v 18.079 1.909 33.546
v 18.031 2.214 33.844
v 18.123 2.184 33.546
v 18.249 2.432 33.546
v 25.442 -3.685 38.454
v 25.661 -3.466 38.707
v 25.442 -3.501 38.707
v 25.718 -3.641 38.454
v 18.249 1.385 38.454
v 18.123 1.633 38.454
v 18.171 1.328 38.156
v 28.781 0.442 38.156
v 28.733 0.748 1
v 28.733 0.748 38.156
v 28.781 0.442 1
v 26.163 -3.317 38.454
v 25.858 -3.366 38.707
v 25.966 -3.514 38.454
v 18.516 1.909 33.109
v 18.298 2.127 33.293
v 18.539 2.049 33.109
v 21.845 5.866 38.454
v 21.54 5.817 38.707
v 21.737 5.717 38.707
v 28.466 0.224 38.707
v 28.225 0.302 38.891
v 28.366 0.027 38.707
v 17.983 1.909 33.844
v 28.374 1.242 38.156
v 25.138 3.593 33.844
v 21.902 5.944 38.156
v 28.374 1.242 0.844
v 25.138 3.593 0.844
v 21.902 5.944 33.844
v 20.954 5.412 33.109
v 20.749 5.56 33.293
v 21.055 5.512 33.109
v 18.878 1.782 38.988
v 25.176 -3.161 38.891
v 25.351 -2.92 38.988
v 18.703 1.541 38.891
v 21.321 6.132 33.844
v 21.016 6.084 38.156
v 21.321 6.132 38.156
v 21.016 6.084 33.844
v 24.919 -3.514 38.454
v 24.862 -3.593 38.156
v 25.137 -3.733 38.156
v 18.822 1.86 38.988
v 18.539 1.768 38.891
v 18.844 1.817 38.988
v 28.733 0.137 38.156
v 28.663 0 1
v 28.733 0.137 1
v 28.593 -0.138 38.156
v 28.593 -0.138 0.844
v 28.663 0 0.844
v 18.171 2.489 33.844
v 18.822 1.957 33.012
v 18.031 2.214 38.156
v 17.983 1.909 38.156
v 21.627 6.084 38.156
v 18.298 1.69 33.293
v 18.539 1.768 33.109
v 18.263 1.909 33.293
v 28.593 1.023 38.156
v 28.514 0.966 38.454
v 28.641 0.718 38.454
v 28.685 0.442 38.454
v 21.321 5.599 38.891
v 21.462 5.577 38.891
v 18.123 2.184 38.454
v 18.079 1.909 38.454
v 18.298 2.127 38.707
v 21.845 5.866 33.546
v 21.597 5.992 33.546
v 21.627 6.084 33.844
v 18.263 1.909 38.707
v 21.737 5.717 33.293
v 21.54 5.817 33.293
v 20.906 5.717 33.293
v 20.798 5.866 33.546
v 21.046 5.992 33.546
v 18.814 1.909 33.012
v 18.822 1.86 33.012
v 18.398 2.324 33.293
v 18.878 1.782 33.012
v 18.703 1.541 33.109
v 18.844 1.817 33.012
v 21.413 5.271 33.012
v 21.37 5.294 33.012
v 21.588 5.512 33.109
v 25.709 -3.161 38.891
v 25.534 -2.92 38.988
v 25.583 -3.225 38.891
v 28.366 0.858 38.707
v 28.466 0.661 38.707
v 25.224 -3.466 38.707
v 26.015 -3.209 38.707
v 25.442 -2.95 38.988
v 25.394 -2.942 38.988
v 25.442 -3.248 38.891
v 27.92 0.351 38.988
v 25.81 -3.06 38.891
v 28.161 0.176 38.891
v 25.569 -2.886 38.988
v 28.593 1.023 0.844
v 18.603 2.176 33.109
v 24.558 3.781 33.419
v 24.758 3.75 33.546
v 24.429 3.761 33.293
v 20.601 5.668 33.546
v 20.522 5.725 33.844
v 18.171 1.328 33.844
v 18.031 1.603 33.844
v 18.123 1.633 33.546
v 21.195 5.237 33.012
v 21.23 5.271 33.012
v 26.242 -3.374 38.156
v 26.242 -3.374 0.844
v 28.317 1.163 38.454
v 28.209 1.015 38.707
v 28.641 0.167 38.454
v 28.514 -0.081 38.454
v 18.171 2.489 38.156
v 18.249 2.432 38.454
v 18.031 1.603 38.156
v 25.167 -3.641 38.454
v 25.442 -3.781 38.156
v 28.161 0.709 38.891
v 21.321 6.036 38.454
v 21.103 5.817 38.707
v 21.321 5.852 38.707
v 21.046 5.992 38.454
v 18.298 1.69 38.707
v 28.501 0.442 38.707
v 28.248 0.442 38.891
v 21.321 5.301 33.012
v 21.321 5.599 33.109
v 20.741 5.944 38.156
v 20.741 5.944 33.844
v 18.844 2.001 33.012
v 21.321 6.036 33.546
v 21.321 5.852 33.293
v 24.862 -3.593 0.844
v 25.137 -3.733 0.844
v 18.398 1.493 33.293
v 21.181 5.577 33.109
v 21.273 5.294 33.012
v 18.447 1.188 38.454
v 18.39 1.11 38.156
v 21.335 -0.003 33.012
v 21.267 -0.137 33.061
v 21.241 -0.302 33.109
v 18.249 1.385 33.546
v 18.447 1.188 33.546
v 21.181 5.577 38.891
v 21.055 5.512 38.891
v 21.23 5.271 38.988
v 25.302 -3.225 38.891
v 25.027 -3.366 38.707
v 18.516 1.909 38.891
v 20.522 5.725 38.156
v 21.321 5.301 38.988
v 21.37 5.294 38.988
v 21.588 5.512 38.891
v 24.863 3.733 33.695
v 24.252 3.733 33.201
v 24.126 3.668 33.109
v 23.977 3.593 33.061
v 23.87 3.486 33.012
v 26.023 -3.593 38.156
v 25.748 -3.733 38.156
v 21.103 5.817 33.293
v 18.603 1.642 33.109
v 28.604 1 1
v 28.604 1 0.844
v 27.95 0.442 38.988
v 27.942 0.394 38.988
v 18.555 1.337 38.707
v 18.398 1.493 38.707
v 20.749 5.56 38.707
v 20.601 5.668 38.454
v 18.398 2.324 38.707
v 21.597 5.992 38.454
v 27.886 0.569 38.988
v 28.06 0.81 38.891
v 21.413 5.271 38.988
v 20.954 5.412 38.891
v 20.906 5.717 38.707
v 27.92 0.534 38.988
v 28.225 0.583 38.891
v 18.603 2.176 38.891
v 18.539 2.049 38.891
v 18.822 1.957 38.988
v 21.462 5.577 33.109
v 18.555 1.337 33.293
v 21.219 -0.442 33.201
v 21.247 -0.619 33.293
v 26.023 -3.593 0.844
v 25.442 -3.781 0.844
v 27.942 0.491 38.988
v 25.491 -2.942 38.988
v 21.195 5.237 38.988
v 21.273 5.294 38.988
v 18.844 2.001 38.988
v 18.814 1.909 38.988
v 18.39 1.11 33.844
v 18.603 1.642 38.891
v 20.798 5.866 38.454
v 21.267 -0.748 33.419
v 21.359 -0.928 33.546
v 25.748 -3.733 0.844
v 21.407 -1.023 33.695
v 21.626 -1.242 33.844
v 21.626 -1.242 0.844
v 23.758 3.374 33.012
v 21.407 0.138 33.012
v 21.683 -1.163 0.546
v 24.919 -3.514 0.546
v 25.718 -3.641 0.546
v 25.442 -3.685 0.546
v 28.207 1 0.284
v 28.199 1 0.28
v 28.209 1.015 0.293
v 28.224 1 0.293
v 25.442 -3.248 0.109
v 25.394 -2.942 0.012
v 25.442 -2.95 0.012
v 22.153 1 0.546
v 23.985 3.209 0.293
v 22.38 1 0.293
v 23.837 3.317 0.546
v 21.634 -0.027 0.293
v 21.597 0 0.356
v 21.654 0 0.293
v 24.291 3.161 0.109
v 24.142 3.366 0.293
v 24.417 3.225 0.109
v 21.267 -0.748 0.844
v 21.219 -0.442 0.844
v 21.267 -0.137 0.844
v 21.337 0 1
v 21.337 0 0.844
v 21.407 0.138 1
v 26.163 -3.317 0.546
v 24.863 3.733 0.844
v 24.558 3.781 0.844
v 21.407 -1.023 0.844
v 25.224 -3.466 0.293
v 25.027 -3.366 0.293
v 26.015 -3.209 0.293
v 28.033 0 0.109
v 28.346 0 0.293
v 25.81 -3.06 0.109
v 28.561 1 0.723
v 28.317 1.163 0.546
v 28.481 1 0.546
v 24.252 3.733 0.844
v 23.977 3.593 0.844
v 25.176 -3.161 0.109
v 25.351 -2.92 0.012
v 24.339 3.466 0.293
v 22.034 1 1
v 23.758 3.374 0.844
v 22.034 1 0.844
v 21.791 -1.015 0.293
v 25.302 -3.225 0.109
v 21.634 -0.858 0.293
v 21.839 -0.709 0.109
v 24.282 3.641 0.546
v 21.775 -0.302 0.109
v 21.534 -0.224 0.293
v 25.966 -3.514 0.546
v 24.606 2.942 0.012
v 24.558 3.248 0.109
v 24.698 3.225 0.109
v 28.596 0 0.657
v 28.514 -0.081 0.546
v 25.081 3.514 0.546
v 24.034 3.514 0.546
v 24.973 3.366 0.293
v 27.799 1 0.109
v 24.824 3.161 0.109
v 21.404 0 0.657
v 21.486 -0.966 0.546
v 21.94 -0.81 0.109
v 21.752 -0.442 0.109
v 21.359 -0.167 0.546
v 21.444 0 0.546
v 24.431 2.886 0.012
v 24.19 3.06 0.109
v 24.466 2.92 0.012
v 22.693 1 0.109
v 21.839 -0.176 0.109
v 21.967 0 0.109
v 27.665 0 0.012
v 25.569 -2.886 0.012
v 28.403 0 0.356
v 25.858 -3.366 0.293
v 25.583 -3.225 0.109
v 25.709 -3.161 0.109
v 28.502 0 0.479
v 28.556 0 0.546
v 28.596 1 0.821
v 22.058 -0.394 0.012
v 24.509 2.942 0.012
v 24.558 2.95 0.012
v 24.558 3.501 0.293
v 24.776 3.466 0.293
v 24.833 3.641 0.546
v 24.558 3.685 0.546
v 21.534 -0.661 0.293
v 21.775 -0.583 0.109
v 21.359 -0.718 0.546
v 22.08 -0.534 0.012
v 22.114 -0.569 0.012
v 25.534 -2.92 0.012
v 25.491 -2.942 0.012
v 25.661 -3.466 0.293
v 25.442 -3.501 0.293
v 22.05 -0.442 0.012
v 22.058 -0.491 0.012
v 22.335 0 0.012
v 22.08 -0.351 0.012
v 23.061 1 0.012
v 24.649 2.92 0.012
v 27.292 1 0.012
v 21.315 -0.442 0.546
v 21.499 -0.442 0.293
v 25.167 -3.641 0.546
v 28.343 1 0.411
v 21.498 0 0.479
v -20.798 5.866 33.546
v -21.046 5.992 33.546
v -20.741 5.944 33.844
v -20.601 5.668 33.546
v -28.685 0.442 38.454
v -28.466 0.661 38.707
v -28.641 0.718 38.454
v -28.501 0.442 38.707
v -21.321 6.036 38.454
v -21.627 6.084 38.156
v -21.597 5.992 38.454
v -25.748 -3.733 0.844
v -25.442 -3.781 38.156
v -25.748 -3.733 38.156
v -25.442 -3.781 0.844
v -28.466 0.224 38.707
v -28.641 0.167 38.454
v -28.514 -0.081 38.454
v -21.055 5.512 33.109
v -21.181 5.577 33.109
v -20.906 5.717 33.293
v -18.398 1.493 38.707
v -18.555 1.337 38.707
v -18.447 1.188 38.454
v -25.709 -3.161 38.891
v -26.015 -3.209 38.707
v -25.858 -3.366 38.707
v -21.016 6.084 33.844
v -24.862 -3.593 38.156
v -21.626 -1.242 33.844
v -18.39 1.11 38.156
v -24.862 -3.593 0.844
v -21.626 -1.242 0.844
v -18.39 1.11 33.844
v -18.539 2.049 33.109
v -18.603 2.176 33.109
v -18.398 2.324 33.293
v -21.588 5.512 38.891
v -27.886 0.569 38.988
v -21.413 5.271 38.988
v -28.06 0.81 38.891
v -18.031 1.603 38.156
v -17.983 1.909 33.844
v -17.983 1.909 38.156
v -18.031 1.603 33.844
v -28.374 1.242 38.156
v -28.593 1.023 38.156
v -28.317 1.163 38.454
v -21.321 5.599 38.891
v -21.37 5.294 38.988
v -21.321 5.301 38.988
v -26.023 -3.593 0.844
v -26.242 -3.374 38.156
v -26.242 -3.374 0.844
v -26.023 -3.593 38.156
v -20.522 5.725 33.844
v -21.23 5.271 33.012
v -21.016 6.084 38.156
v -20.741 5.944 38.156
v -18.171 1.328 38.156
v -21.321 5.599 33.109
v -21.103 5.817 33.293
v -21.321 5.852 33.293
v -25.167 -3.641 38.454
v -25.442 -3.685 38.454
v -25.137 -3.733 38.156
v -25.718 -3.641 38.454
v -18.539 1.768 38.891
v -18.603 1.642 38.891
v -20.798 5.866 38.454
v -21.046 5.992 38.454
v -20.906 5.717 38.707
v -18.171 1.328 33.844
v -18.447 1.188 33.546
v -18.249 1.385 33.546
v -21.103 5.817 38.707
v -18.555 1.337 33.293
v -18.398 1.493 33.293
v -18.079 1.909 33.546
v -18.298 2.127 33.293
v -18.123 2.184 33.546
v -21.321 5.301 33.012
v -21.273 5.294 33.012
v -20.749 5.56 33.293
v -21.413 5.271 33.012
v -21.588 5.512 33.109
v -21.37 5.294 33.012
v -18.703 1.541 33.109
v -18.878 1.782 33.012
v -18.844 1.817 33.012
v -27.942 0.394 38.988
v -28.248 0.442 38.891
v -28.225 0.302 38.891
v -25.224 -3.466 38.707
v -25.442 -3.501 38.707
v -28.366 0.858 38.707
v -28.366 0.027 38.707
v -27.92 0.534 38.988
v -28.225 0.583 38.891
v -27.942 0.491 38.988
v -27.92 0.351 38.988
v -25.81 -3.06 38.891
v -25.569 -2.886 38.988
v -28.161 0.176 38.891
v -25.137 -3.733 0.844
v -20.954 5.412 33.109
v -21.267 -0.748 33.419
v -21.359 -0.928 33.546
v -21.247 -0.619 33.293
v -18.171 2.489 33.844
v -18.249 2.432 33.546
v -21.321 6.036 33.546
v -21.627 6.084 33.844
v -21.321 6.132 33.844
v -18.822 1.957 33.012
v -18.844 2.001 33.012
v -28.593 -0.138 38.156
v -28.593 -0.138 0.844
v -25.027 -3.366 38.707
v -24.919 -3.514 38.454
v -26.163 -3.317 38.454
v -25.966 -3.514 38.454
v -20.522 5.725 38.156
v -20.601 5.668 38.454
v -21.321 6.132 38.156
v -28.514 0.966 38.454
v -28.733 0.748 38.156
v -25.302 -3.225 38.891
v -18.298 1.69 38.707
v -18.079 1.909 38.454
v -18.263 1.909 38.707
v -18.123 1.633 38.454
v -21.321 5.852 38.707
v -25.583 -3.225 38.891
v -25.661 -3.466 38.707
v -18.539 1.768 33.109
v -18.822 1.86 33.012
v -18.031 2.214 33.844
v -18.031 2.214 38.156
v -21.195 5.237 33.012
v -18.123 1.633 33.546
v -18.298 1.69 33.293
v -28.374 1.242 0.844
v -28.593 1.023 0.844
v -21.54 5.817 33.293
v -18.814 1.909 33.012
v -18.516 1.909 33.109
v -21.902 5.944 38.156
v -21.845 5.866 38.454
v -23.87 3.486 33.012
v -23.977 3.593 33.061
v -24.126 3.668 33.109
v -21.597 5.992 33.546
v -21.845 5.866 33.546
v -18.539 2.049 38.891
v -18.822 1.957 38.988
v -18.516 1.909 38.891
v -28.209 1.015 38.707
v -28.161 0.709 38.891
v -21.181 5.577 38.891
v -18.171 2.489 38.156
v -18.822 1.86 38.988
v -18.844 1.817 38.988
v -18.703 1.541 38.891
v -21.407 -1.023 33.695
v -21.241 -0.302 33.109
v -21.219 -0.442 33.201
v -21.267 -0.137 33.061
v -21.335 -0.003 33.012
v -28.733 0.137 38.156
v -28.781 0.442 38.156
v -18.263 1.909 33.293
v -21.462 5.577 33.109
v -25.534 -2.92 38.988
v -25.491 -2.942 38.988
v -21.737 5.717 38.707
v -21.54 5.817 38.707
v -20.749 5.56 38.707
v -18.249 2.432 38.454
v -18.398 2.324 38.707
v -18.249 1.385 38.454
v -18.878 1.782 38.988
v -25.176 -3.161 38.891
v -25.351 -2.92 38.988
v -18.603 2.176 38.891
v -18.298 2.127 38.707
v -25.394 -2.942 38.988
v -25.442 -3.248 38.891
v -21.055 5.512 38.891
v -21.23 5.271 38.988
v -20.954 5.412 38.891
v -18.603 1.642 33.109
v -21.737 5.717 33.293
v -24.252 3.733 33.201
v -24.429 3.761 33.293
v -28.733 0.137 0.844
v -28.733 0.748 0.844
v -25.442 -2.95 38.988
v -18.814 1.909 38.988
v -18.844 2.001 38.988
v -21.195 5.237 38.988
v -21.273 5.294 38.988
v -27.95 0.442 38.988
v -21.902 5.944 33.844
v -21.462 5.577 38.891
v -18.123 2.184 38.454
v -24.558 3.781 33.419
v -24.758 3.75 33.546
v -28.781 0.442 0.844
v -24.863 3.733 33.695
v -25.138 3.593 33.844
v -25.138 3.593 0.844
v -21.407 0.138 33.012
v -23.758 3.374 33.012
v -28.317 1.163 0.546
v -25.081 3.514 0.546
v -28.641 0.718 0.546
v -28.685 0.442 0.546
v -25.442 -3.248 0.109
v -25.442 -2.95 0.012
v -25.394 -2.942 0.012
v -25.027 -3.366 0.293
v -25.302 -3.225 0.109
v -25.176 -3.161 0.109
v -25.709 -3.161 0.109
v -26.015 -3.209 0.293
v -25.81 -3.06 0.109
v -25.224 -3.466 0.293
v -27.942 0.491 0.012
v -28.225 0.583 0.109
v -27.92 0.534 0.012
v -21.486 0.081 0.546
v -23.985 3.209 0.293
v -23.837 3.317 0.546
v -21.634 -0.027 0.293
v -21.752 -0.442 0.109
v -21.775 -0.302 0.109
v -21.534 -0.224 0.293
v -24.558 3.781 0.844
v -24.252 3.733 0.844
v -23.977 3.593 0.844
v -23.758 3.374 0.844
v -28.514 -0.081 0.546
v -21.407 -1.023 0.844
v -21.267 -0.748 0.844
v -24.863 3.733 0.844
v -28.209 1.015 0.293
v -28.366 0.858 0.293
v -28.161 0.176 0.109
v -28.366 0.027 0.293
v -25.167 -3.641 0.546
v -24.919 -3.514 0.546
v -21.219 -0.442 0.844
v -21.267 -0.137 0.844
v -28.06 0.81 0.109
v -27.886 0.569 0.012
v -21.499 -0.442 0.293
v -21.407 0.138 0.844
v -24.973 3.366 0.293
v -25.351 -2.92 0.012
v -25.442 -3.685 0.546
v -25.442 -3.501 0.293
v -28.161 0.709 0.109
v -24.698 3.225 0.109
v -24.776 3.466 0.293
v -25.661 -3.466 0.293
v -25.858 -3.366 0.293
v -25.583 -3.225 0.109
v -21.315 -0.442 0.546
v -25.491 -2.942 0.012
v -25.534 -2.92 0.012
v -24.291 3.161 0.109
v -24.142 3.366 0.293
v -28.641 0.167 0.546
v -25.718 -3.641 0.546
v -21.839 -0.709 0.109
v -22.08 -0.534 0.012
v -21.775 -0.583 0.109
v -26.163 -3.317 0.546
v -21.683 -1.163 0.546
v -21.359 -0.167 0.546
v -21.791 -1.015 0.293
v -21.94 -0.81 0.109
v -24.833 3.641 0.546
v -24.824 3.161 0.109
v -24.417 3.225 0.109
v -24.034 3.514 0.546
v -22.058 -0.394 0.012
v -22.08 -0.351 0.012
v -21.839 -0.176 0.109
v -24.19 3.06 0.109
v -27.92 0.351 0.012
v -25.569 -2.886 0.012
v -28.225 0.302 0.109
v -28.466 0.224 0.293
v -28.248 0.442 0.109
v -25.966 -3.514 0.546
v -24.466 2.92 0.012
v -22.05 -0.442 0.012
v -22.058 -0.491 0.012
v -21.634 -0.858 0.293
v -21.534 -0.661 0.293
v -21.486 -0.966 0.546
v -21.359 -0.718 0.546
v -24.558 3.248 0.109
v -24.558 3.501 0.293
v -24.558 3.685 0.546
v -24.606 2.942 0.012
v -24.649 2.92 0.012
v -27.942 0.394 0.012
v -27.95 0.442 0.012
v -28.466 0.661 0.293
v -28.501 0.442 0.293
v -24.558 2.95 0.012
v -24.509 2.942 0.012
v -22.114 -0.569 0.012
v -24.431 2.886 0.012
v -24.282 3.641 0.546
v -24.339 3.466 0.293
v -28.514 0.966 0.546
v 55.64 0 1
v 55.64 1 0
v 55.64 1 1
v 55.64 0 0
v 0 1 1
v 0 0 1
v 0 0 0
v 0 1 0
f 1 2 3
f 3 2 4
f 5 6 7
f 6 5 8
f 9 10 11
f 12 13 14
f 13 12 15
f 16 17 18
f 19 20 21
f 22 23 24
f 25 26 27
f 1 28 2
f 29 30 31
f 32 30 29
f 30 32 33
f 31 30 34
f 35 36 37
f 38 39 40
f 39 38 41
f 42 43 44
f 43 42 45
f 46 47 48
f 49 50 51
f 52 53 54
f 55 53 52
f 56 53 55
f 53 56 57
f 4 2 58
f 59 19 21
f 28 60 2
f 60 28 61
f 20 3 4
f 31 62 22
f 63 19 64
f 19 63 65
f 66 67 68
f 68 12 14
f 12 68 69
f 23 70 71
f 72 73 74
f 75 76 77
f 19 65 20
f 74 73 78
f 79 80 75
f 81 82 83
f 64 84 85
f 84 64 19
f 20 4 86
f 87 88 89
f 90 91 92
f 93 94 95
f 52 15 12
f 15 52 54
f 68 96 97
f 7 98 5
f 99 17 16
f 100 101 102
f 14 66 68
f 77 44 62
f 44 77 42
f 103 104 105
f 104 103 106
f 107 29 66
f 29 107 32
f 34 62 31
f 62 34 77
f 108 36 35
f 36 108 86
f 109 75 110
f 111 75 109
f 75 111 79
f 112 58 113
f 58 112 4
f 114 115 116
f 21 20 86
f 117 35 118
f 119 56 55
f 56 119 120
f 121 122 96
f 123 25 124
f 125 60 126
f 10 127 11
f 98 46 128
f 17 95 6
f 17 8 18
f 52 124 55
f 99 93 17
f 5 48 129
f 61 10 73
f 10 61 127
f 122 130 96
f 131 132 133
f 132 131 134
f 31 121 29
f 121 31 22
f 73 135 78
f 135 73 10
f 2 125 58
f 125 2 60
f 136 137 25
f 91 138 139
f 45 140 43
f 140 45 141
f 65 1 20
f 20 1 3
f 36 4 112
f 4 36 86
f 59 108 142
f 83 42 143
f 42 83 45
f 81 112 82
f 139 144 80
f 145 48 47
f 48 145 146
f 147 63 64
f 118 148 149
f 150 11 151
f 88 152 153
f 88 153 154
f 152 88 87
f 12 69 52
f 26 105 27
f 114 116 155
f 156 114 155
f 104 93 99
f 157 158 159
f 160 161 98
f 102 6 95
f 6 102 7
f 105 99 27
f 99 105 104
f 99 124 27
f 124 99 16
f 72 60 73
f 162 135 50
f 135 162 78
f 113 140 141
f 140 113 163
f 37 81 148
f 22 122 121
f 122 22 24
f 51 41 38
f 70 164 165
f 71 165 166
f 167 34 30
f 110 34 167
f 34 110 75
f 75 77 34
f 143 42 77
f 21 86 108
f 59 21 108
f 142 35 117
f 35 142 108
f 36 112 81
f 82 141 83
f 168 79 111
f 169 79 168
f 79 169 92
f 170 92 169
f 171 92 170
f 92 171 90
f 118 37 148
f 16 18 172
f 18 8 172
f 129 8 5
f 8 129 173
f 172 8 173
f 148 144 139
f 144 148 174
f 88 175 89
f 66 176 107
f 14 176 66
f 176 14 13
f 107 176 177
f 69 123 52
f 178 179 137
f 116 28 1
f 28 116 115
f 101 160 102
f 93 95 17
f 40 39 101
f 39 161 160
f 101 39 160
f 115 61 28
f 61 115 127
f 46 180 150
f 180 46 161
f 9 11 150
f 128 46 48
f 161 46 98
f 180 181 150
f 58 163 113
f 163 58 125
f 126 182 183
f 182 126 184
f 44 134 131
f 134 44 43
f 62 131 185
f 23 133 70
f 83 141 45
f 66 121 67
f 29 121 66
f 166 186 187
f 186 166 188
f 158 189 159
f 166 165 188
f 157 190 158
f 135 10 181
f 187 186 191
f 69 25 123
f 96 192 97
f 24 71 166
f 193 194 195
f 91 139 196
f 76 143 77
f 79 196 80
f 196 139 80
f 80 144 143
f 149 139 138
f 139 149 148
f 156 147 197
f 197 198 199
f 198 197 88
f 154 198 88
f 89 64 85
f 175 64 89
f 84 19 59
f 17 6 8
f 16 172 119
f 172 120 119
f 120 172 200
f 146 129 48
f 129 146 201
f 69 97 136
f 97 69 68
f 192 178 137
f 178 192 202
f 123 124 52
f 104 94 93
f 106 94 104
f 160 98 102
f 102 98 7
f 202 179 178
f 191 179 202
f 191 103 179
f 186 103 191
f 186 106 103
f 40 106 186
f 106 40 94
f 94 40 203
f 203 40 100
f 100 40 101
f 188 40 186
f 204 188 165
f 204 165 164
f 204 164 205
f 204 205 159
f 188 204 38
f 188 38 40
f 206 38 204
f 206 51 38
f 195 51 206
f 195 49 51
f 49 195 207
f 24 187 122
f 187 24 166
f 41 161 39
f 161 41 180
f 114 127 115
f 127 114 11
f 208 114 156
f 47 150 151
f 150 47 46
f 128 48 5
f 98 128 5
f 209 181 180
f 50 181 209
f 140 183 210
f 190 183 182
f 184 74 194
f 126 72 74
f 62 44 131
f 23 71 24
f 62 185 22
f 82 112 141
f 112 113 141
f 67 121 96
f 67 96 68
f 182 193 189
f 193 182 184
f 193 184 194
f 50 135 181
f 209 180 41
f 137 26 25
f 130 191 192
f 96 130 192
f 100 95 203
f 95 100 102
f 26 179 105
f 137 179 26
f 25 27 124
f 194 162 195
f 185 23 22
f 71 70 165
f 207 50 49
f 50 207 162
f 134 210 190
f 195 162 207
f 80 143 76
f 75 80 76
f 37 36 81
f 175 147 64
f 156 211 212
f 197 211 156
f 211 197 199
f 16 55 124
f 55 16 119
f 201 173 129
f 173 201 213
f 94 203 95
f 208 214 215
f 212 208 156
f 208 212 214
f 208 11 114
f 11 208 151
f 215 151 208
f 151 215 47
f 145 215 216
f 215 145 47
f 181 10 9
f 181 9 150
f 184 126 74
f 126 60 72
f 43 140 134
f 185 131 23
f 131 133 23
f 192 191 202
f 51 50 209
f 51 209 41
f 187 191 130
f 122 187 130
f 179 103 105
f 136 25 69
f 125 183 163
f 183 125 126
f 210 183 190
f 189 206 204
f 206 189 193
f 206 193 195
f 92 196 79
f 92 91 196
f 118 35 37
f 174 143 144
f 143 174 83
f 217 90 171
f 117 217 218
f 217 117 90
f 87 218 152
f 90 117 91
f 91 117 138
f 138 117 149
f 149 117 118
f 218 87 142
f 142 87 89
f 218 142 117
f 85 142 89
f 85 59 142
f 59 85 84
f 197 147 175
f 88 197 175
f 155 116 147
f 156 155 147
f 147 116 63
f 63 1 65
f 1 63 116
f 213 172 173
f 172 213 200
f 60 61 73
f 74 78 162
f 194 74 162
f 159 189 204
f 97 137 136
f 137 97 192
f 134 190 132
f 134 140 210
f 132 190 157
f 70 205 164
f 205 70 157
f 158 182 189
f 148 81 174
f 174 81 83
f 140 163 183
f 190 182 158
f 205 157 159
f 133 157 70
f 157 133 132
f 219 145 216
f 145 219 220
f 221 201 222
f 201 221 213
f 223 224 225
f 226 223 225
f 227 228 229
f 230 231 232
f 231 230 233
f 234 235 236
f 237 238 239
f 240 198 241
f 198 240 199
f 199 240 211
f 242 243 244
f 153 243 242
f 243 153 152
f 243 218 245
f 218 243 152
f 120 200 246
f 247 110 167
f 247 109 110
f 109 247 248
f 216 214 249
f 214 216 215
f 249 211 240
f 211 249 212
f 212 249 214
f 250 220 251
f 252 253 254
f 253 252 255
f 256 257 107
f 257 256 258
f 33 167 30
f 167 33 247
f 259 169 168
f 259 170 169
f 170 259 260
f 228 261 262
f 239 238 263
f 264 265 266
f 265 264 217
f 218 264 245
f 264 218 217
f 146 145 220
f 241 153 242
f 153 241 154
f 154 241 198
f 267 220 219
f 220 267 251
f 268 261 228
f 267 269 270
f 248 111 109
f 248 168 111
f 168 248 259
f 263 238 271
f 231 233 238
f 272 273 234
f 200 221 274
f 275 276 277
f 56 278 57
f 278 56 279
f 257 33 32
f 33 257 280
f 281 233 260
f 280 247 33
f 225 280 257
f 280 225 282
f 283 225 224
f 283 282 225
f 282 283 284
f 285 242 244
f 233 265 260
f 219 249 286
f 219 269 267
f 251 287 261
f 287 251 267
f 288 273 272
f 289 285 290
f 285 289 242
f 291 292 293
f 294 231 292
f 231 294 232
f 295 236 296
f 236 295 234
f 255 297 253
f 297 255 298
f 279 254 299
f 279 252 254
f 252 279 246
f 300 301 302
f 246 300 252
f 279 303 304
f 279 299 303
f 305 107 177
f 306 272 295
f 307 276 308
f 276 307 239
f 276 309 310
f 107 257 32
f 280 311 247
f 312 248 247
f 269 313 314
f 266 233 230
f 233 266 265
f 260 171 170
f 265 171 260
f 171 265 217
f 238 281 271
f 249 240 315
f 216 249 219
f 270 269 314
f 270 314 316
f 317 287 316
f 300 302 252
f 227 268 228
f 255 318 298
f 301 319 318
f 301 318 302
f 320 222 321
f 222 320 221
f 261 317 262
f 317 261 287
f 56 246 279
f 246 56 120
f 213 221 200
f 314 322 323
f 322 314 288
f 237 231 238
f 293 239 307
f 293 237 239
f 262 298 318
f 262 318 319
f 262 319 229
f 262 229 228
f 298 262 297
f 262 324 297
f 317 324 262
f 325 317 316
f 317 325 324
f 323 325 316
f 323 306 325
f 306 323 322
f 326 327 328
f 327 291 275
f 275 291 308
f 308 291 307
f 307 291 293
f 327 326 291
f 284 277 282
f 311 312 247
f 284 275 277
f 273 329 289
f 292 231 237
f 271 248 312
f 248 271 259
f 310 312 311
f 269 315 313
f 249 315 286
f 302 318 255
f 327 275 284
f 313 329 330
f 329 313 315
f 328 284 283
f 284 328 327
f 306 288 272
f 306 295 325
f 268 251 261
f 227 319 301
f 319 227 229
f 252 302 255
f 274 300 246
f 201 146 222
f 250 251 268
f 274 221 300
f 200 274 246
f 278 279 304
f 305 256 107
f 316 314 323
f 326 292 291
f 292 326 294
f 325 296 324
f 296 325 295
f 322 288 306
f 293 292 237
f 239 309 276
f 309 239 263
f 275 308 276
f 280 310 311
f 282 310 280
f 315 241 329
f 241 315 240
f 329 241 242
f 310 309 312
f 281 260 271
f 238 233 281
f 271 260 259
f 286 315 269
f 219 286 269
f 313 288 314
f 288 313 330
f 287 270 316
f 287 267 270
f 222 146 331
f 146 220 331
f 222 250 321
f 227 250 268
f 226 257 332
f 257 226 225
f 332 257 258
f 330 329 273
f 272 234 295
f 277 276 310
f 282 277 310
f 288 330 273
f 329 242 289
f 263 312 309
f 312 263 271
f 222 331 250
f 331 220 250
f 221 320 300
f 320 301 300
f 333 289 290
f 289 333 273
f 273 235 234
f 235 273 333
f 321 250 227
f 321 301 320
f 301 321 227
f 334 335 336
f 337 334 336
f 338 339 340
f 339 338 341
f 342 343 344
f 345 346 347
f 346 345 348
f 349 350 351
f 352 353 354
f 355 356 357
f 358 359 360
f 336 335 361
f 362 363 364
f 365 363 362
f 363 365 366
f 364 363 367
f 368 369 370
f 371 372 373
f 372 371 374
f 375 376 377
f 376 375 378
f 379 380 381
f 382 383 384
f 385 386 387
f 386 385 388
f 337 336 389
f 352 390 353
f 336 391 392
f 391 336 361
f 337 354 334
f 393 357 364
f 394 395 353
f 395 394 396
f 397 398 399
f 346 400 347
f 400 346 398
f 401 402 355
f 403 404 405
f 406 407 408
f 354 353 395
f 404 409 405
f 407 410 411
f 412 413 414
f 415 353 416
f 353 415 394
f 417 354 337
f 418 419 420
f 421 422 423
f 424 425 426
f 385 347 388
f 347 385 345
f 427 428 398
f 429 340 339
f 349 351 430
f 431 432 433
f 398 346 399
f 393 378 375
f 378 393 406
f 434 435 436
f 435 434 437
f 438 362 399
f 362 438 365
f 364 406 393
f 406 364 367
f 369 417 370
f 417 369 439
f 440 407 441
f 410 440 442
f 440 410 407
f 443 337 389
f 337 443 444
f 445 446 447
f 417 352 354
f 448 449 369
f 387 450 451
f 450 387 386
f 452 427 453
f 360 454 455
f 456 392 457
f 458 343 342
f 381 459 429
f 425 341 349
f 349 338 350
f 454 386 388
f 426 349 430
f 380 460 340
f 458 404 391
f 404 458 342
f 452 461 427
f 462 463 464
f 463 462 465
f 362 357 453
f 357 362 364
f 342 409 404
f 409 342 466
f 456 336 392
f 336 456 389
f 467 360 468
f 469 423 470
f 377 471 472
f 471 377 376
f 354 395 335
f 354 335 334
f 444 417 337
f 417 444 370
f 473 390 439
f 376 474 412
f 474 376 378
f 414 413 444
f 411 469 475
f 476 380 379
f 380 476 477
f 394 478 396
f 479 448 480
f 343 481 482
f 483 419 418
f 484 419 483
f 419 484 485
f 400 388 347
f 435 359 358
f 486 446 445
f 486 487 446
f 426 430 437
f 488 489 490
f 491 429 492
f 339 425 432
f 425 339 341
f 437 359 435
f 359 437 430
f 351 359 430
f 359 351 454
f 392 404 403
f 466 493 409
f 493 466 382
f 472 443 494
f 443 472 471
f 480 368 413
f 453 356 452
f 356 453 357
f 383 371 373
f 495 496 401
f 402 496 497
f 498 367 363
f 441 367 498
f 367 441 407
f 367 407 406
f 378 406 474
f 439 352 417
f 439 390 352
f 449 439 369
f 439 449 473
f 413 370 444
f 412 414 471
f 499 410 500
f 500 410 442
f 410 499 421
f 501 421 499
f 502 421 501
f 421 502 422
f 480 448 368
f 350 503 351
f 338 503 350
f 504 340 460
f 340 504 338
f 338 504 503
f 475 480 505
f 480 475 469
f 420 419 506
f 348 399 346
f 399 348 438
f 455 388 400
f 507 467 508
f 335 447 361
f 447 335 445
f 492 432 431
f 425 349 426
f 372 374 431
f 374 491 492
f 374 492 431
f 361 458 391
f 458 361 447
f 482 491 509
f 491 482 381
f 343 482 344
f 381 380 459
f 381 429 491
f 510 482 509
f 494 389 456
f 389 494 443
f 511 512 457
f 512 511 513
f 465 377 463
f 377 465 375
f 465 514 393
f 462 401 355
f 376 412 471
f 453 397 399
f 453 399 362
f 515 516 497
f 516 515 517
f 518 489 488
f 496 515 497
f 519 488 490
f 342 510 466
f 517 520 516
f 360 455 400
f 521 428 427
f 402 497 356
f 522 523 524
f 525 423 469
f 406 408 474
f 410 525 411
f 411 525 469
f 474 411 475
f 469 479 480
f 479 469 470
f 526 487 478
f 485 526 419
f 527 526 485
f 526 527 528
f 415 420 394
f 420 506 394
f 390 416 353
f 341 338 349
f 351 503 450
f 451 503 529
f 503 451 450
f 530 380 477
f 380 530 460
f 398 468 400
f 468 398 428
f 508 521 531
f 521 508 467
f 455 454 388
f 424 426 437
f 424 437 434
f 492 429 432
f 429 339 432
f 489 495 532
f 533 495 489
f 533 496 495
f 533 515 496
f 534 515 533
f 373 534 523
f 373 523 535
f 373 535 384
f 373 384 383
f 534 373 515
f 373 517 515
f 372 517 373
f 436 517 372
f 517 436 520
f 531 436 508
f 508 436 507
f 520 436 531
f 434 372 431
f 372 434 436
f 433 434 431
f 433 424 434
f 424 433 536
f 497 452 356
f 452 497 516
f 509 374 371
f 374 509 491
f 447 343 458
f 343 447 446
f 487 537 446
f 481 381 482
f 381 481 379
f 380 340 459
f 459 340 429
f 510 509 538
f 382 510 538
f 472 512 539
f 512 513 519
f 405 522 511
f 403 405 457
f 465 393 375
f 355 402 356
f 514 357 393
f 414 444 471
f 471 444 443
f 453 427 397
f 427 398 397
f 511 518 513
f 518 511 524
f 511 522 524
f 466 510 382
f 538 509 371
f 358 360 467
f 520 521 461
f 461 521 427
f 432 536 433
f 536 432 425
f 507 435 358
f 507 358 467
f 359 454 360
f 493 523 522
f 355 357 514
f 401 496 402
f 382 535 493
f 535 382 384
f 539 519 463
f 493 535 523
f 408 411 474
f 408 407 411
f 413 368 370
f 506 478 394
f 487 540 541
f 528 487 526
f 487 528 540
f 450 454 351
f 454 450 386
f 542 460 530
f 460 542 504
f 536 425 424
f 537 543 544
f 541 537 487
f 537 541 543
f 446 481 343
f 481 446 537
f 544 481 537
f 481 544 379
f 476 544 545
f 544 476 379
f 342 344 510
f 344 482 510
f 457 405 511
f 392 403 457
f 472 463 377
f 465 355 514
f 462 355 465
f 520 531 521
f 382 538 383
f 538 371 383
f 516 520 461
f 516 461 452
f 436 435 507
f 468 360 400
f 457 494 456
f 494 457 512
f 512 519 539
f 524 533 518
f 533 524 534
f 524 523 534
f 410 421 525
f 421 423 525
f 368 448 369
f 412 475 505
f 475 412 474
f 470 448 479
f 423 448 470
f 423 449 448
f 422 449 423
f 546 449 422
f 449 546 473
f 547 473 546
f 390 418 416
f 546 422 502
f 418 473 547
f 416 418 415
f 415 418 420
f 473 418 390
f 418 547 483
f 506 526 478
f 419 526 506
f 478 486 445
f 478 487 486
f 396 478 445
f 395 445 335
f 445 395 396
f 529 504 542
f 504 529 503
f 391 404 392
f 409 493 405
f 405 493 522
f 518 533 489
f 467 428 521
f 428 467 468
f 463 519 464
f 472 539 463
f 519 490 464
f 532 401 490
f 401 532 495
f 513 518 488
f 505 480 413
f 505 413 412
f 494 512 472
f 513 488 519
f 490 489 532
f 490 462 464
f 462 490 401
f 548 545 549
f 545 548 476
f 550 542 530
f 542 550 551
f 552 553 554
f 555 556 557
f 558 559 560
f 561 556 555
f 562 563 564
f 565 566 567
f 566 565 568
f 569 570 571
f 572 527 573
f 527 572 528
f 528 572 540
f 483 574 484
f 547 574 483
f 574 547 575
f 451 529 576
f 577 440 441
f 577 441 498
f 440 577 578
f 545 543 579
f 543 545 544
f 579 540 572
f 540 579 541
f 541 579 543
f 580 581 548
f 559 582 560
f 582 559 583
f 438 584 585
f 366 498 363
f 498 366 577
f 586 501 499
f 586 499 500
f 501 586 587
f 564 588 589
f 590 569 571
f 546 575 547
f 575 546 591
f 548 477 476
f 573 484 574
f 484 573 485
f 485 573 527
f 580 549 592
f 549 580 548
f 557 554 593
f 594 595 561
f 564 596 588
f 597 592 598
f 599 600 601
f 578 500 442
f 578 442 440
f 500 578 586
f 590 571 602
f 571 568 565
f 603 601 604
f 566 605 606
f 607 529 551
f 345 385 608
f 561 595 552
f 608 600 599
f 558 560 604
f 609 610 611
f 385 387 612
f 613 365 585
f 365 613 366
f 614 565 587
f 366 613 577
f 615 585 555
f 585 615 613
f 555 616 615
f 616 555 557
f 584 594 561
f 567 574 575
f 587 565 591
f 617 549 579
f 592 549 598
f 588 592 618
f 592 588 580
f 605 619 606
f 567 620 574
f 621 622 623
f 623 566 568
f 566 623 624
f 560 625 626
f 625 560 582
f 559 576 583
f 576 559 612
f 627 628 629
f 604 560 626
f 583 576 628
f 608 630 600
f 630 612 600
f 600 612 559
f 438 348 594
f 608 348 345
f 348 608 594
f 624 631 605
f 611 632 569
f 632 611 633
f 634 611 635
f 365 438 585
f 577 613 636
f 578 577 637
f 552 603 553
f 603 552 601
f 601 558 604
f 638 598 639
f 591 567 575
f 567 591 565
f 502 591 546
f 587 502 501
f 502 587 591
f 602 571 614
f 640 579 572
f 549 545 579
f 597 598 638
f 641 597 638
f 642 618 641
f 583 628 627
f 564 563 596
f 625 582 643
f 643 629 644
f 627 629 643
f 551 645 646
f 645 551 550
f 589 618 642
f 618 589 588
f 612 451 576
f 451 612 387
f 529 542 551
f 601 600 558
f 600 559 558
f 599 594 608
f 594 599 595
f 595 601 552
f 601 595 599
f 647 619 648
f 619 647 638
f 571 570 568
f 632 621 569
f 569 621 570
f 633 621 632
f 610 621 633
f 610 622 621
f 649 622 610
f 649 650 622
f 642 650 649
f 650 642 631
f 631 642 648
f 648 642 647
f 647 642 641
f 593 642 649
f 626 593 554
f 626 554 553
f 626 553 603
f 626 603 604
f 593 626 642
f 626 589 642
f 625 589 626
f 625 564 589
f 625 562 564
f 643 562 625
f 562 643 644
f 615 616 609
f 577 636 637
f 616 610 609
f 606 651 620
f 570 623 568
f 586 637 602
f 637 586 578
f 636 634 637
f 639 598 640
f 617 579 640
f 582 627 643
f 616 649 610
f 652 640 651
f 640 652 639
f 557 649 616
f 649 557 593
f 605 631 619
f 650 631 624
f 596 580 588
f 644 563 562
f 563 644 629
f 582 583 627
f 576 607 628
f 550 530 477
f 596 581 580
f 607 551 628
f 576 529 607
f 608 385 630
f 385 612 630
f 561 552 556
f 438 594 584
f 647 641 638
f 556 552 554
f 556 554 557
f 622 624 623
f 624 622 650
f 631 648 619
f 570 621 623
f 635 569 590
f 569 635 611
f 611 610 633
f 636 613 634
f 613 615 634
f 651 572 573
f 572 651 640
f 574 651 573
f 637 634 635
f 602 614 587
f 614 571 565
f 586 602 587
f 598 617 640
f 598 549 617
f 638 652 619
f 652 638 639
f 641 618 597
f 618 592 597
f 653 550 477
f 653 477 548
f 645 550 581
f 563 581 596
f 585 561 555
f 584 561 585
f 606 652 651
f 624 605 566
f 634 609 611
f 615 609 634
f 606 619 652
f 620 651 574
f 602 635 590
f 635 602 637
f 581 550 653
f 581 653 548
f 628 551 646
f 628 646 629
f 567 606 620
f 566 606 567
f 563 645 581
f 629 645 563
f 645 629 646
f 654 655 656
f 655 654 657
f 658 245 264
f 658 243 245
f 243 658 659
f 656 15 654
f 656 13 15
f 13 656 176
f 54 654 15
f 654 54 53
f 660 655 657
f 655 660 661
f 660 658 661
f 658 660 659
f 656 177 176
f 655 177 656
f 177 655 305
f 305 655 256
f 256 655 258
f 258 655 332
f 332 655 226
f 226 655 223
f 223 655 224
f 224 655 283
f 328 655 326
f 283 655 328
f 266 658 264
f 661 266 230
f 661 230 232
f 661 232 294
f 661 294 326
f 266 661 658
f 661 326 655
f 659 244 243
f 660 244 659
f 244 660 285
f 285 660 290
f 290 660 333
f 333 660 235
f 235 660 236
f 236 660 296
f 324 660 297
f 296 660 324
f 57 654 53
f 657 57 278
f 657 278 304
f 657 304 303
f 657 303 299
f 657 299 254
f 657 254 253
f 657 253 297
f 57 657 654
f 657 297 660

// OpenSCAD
body_h = 33;
bottom_h = 7;

hook_w = 4;

hooks_dist = 50;

m_r = 1;

angle = 54;

module hook() {
    translate( [ -hook_w / 2, -hook_w / 2, m_r ] ){
        minkowski(){
            union(){
                cube( [ hook_w, hook_w, body_h + hook_w ] );
                translate( [ 0, 0, body_h ] )
                    cube( [ hook_w, 2 * hook_w, hook_w ] );
            }
            sphere( r = m_r, $fn = 20 );
        }
    }
}


translate( [ hooks_dist / 2, 0, 0 ] )
    rotate( angle, [ 0, 0, 1 ] )
        hook();
translate( [ -hooks_dist / 2, 0, 0 ] )
    rotate( -angle, [ 0, 0, 1 ] )
        hook();

cube( [ hooks_dist + 1.41 * hook_w, 1, 1 ] );
